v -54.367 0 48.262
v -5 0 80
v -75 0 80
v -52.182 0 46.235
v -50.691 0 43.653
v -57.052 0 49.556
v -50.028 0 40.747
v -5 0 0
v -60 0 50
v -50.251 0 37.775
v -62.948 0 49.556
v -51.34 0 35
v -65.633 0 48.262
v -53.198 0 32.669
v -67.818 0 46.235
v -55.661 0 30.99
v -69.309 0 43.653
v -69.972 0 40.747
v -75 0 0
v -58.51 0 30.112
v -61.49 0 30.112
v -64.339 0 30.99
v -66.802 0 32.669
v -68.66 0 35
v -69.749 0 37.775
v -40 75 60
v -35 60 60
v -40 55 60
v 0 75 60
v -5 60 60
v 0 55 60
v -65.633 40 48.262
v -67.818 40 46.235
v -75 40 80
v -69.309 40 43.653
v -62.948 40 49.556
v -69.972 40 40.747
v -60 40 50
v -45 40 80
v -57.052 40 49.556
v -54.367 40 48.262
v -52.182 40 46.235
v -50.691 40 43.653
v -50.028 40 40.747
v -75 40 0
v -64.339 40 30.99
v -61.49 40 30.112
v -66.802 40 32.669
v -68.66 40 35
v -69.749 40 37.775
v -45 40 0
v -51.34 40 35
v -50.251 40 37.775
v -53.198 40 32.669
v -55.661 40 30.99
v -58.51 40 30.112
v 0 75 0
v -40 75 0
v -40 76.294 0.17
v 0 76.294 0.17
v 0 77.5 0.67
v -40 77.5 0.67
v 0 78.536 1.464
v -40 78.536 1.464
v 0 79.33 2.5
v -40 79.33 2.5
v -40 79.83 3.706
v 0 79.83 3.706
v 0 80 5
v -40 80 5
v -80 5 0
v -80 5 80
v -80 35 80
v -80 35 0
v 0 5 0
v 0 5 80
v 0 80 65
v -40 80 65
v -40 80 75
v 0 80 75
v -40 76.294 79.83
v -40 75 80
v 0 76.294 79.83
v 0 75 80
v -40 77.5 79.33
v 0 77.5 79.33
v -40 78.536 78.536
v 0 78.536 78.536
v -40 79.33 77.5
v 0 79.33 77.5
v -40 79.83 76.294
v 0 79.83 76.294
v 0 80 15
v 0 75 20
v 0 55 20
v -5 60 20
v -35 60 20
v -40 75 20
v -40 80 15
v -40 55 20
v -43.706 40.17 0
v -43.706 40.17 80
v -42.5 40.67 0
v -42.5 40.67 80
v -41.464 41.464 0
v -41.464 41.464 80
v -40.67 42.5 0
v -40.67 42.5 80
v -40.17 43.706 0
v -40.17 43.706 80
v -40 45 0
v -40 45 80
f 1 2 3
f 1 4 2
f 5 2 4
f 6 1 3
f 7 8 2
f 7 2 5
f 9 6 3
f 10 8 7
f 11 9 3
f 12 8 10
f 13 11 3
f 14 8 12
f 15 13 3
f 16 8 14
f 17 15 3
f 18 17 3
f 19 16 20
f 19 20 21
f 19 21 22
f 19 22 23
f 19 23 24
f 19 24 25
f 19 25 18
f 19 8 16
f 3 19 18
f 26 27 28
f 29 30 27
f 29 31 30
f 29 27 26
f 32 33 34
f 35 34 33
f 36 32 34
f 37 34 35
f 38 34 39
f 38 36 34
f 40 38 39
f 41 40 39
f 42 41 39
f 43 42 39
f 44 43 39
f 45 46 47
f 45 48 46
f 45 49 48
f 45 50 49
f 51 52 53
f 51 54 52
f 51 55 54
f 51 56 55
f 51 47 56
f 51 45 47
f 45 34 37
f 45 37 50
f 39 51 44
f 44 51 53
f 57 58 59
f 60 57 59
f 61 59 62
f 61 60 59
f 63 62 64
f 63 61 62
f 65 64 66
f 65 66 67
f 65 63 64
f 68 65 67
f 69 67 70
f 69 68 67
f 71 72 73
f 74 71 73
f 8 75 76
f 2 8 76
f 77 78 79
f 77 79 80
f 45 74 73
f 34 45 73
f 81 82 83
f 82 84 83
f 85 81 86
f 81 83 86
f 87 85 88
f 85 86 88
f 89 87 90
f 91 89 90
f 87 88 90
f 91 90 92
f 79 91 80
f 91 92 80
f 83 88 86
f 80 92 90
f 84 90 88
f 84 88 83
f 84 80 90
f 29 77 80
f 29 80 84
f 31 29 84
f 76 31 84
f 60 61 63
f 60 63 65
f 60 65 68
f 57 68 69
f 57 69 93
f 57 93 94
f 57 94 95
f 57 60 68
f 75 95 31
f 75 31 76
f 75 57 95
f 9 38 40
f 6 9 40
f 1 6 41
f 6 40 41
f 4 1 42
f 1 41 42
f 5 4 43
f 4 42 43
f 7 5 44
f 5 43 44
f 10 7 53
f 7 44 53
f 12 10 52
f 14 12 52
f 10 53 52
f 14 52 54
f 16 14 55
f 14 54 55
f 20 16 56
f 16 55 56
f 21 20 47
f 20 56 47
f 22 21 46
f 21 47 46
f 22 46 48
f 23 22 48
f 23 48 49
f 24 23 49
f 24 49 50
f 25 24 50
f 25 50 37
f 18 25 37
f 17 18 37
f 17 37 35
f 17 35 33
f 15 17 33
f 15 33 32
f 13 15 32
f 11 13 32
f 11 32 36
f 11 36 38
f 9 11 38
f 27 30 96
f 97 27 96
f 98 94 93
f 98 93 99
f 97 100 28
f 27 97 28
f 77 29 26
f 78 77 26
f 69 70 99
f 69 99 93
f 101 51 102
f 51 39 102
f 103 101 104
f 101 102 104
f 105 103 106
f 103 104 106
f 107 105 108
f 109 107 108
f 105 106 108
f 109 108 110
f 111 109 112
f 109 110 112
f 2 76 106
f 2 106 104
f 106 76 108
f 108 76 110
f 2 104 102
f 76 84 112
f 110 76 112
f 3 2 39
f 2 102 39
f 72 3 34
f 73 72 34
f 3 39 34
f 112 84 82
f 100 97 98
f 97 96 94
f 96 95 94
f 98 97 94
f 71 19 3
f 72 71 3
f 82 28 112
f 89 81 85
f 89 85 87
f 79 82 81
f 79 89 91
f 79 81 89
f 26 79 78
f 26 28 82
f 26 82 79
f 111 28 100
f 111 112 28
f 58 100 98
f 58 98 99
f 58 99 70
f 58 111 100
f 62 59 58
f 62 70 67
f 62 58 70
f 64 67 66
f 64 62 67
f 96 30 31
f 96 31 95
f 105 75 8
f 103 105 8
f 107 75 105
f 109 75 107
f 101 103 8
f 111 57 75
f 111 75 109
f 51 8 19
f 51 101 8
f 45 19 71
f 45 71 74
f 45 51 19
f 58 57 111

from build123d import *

# Parameters (mm, degrees)
BOSS_EXTRUDE1_DEPTH = 80
SKETCH3_W           = 40
SKETCH3_H           = 20
CUT_EXTRUDE1_DEPTH  = 139.564064606
FILLET1_R           = 5
CHAMFER1_SIZE       = 5
SKETCH4_R           = 10
CUT_EXTRUDE2_DEPTH  = 121
CHAMFER2_SIZE       = 5
FILLET2_R           = 5
CHAMFER3_SIZE       = 5
CHAMFER4_SIZE       = 5
CHAMFER5_SIZE       = 5
CHAMFER6_SIZE       = 5


with BuildPart() as part:
    # Sketch1 → Boss-Extrude1 (new body)
    with BuildSketch(Plane.XY):
        Polygon((0, 0), (-80, 0), (-80, 40), (-40, 40), (-40, 80), (0, 80), align=None)
    extrude(amount=BOSS_EXTRUDE1_DEPTH)

    # Sketch3 → Cut-Extrude1 (cut, through all)
    with BuildSketch(Plane(origin=(0, 0, 0), x_dir=(0, 0, -1), z_dir=(1, 0, 0))):
        with Locations((-40, 70)):
            Rectangle(SKETCH3_W, SKETCH3_H)
    extrude(amount=-CUT_EXTRUDE1_DEPTH, mode=Mode.SUBTRACT)

    # Fillet1
    fillet1_edges = [part.edges().sort_by_distance(p)[0] for p in [
        (-20, 80, 80),
        (-20, 80, 0),
    ]]
    fillet(fillet1_edges, radius=FILLET1_R)

    # Chamfer1
    chamfer1_edges = [part.edges().sort_by_distance(p)[0] for p in [
        (-20, 80, 60),
        (-20, 80, 20),
    ]]
    chamfer(chamfer1_edges, length=CHAMFER1_SIZE)

    # Sketch4 → Cut-Extrude2 (cut, through all)
    with BuildSketch(Plane(origin=(0, 40, 0), x_dir=(1, 0, 0), z_dir=(0, 1, 0))):
        with Locations(Location((-60, -40, 0), (0, 0, 270))):
            Circle(SKETCH4_R)
    extrude(amount=-CUT_EXTRUDE2_DEPTH, mode=Mode.SUBTRACT)

    # Chamfer2
    chamfer2_edges = [part.edges().sort_by_distance(p)[0] for p in [
        (-80, 40, 40),
    ]]
    chamfer(chamfer2_edges, length=CHAMFER2_SIZE)

    # Fillet2
    fillet2_edges = [part.edges().sort_by_distance(p)[0] for p in [
        (-40, 40, 40),
    ]]
    fillet(fillet2_edges, radius=FILLET2_R)

    # Chamfer3
    chamfer3_edges = [part.edges().sort_by_distance(p)[0] for p in [
        (-80, 0, 40),
    ]]
    chamfer(chamfer3_edges, length=CHAMFER3_SIZE)

    # Chamfer4
    chamfer4_edges = [part.edges().sort_by_distance(p)[0] for p in [
        (0, 0, 40),
    ]]
    chamfer(chamfer4_edges, length=CHAMFER4_SIZE)

    # Chamfer5
    chamfer5_edges = [part.edges().sort_by_distance(p)[0] for p in [
        (0, 60, 40),
    ]]
    chamfer(chamfer5_edges, length=CHAMFER5_SIZE)

    # Chamfer6
    chamfer6_edges = [part.edges().sort_by_distance(p)[0] for p in [
        (-40, 60, 40),
    ]]
    chamfer(chamfer6_edges, length=CHAMFER6_SIZE)


solid = part.part
